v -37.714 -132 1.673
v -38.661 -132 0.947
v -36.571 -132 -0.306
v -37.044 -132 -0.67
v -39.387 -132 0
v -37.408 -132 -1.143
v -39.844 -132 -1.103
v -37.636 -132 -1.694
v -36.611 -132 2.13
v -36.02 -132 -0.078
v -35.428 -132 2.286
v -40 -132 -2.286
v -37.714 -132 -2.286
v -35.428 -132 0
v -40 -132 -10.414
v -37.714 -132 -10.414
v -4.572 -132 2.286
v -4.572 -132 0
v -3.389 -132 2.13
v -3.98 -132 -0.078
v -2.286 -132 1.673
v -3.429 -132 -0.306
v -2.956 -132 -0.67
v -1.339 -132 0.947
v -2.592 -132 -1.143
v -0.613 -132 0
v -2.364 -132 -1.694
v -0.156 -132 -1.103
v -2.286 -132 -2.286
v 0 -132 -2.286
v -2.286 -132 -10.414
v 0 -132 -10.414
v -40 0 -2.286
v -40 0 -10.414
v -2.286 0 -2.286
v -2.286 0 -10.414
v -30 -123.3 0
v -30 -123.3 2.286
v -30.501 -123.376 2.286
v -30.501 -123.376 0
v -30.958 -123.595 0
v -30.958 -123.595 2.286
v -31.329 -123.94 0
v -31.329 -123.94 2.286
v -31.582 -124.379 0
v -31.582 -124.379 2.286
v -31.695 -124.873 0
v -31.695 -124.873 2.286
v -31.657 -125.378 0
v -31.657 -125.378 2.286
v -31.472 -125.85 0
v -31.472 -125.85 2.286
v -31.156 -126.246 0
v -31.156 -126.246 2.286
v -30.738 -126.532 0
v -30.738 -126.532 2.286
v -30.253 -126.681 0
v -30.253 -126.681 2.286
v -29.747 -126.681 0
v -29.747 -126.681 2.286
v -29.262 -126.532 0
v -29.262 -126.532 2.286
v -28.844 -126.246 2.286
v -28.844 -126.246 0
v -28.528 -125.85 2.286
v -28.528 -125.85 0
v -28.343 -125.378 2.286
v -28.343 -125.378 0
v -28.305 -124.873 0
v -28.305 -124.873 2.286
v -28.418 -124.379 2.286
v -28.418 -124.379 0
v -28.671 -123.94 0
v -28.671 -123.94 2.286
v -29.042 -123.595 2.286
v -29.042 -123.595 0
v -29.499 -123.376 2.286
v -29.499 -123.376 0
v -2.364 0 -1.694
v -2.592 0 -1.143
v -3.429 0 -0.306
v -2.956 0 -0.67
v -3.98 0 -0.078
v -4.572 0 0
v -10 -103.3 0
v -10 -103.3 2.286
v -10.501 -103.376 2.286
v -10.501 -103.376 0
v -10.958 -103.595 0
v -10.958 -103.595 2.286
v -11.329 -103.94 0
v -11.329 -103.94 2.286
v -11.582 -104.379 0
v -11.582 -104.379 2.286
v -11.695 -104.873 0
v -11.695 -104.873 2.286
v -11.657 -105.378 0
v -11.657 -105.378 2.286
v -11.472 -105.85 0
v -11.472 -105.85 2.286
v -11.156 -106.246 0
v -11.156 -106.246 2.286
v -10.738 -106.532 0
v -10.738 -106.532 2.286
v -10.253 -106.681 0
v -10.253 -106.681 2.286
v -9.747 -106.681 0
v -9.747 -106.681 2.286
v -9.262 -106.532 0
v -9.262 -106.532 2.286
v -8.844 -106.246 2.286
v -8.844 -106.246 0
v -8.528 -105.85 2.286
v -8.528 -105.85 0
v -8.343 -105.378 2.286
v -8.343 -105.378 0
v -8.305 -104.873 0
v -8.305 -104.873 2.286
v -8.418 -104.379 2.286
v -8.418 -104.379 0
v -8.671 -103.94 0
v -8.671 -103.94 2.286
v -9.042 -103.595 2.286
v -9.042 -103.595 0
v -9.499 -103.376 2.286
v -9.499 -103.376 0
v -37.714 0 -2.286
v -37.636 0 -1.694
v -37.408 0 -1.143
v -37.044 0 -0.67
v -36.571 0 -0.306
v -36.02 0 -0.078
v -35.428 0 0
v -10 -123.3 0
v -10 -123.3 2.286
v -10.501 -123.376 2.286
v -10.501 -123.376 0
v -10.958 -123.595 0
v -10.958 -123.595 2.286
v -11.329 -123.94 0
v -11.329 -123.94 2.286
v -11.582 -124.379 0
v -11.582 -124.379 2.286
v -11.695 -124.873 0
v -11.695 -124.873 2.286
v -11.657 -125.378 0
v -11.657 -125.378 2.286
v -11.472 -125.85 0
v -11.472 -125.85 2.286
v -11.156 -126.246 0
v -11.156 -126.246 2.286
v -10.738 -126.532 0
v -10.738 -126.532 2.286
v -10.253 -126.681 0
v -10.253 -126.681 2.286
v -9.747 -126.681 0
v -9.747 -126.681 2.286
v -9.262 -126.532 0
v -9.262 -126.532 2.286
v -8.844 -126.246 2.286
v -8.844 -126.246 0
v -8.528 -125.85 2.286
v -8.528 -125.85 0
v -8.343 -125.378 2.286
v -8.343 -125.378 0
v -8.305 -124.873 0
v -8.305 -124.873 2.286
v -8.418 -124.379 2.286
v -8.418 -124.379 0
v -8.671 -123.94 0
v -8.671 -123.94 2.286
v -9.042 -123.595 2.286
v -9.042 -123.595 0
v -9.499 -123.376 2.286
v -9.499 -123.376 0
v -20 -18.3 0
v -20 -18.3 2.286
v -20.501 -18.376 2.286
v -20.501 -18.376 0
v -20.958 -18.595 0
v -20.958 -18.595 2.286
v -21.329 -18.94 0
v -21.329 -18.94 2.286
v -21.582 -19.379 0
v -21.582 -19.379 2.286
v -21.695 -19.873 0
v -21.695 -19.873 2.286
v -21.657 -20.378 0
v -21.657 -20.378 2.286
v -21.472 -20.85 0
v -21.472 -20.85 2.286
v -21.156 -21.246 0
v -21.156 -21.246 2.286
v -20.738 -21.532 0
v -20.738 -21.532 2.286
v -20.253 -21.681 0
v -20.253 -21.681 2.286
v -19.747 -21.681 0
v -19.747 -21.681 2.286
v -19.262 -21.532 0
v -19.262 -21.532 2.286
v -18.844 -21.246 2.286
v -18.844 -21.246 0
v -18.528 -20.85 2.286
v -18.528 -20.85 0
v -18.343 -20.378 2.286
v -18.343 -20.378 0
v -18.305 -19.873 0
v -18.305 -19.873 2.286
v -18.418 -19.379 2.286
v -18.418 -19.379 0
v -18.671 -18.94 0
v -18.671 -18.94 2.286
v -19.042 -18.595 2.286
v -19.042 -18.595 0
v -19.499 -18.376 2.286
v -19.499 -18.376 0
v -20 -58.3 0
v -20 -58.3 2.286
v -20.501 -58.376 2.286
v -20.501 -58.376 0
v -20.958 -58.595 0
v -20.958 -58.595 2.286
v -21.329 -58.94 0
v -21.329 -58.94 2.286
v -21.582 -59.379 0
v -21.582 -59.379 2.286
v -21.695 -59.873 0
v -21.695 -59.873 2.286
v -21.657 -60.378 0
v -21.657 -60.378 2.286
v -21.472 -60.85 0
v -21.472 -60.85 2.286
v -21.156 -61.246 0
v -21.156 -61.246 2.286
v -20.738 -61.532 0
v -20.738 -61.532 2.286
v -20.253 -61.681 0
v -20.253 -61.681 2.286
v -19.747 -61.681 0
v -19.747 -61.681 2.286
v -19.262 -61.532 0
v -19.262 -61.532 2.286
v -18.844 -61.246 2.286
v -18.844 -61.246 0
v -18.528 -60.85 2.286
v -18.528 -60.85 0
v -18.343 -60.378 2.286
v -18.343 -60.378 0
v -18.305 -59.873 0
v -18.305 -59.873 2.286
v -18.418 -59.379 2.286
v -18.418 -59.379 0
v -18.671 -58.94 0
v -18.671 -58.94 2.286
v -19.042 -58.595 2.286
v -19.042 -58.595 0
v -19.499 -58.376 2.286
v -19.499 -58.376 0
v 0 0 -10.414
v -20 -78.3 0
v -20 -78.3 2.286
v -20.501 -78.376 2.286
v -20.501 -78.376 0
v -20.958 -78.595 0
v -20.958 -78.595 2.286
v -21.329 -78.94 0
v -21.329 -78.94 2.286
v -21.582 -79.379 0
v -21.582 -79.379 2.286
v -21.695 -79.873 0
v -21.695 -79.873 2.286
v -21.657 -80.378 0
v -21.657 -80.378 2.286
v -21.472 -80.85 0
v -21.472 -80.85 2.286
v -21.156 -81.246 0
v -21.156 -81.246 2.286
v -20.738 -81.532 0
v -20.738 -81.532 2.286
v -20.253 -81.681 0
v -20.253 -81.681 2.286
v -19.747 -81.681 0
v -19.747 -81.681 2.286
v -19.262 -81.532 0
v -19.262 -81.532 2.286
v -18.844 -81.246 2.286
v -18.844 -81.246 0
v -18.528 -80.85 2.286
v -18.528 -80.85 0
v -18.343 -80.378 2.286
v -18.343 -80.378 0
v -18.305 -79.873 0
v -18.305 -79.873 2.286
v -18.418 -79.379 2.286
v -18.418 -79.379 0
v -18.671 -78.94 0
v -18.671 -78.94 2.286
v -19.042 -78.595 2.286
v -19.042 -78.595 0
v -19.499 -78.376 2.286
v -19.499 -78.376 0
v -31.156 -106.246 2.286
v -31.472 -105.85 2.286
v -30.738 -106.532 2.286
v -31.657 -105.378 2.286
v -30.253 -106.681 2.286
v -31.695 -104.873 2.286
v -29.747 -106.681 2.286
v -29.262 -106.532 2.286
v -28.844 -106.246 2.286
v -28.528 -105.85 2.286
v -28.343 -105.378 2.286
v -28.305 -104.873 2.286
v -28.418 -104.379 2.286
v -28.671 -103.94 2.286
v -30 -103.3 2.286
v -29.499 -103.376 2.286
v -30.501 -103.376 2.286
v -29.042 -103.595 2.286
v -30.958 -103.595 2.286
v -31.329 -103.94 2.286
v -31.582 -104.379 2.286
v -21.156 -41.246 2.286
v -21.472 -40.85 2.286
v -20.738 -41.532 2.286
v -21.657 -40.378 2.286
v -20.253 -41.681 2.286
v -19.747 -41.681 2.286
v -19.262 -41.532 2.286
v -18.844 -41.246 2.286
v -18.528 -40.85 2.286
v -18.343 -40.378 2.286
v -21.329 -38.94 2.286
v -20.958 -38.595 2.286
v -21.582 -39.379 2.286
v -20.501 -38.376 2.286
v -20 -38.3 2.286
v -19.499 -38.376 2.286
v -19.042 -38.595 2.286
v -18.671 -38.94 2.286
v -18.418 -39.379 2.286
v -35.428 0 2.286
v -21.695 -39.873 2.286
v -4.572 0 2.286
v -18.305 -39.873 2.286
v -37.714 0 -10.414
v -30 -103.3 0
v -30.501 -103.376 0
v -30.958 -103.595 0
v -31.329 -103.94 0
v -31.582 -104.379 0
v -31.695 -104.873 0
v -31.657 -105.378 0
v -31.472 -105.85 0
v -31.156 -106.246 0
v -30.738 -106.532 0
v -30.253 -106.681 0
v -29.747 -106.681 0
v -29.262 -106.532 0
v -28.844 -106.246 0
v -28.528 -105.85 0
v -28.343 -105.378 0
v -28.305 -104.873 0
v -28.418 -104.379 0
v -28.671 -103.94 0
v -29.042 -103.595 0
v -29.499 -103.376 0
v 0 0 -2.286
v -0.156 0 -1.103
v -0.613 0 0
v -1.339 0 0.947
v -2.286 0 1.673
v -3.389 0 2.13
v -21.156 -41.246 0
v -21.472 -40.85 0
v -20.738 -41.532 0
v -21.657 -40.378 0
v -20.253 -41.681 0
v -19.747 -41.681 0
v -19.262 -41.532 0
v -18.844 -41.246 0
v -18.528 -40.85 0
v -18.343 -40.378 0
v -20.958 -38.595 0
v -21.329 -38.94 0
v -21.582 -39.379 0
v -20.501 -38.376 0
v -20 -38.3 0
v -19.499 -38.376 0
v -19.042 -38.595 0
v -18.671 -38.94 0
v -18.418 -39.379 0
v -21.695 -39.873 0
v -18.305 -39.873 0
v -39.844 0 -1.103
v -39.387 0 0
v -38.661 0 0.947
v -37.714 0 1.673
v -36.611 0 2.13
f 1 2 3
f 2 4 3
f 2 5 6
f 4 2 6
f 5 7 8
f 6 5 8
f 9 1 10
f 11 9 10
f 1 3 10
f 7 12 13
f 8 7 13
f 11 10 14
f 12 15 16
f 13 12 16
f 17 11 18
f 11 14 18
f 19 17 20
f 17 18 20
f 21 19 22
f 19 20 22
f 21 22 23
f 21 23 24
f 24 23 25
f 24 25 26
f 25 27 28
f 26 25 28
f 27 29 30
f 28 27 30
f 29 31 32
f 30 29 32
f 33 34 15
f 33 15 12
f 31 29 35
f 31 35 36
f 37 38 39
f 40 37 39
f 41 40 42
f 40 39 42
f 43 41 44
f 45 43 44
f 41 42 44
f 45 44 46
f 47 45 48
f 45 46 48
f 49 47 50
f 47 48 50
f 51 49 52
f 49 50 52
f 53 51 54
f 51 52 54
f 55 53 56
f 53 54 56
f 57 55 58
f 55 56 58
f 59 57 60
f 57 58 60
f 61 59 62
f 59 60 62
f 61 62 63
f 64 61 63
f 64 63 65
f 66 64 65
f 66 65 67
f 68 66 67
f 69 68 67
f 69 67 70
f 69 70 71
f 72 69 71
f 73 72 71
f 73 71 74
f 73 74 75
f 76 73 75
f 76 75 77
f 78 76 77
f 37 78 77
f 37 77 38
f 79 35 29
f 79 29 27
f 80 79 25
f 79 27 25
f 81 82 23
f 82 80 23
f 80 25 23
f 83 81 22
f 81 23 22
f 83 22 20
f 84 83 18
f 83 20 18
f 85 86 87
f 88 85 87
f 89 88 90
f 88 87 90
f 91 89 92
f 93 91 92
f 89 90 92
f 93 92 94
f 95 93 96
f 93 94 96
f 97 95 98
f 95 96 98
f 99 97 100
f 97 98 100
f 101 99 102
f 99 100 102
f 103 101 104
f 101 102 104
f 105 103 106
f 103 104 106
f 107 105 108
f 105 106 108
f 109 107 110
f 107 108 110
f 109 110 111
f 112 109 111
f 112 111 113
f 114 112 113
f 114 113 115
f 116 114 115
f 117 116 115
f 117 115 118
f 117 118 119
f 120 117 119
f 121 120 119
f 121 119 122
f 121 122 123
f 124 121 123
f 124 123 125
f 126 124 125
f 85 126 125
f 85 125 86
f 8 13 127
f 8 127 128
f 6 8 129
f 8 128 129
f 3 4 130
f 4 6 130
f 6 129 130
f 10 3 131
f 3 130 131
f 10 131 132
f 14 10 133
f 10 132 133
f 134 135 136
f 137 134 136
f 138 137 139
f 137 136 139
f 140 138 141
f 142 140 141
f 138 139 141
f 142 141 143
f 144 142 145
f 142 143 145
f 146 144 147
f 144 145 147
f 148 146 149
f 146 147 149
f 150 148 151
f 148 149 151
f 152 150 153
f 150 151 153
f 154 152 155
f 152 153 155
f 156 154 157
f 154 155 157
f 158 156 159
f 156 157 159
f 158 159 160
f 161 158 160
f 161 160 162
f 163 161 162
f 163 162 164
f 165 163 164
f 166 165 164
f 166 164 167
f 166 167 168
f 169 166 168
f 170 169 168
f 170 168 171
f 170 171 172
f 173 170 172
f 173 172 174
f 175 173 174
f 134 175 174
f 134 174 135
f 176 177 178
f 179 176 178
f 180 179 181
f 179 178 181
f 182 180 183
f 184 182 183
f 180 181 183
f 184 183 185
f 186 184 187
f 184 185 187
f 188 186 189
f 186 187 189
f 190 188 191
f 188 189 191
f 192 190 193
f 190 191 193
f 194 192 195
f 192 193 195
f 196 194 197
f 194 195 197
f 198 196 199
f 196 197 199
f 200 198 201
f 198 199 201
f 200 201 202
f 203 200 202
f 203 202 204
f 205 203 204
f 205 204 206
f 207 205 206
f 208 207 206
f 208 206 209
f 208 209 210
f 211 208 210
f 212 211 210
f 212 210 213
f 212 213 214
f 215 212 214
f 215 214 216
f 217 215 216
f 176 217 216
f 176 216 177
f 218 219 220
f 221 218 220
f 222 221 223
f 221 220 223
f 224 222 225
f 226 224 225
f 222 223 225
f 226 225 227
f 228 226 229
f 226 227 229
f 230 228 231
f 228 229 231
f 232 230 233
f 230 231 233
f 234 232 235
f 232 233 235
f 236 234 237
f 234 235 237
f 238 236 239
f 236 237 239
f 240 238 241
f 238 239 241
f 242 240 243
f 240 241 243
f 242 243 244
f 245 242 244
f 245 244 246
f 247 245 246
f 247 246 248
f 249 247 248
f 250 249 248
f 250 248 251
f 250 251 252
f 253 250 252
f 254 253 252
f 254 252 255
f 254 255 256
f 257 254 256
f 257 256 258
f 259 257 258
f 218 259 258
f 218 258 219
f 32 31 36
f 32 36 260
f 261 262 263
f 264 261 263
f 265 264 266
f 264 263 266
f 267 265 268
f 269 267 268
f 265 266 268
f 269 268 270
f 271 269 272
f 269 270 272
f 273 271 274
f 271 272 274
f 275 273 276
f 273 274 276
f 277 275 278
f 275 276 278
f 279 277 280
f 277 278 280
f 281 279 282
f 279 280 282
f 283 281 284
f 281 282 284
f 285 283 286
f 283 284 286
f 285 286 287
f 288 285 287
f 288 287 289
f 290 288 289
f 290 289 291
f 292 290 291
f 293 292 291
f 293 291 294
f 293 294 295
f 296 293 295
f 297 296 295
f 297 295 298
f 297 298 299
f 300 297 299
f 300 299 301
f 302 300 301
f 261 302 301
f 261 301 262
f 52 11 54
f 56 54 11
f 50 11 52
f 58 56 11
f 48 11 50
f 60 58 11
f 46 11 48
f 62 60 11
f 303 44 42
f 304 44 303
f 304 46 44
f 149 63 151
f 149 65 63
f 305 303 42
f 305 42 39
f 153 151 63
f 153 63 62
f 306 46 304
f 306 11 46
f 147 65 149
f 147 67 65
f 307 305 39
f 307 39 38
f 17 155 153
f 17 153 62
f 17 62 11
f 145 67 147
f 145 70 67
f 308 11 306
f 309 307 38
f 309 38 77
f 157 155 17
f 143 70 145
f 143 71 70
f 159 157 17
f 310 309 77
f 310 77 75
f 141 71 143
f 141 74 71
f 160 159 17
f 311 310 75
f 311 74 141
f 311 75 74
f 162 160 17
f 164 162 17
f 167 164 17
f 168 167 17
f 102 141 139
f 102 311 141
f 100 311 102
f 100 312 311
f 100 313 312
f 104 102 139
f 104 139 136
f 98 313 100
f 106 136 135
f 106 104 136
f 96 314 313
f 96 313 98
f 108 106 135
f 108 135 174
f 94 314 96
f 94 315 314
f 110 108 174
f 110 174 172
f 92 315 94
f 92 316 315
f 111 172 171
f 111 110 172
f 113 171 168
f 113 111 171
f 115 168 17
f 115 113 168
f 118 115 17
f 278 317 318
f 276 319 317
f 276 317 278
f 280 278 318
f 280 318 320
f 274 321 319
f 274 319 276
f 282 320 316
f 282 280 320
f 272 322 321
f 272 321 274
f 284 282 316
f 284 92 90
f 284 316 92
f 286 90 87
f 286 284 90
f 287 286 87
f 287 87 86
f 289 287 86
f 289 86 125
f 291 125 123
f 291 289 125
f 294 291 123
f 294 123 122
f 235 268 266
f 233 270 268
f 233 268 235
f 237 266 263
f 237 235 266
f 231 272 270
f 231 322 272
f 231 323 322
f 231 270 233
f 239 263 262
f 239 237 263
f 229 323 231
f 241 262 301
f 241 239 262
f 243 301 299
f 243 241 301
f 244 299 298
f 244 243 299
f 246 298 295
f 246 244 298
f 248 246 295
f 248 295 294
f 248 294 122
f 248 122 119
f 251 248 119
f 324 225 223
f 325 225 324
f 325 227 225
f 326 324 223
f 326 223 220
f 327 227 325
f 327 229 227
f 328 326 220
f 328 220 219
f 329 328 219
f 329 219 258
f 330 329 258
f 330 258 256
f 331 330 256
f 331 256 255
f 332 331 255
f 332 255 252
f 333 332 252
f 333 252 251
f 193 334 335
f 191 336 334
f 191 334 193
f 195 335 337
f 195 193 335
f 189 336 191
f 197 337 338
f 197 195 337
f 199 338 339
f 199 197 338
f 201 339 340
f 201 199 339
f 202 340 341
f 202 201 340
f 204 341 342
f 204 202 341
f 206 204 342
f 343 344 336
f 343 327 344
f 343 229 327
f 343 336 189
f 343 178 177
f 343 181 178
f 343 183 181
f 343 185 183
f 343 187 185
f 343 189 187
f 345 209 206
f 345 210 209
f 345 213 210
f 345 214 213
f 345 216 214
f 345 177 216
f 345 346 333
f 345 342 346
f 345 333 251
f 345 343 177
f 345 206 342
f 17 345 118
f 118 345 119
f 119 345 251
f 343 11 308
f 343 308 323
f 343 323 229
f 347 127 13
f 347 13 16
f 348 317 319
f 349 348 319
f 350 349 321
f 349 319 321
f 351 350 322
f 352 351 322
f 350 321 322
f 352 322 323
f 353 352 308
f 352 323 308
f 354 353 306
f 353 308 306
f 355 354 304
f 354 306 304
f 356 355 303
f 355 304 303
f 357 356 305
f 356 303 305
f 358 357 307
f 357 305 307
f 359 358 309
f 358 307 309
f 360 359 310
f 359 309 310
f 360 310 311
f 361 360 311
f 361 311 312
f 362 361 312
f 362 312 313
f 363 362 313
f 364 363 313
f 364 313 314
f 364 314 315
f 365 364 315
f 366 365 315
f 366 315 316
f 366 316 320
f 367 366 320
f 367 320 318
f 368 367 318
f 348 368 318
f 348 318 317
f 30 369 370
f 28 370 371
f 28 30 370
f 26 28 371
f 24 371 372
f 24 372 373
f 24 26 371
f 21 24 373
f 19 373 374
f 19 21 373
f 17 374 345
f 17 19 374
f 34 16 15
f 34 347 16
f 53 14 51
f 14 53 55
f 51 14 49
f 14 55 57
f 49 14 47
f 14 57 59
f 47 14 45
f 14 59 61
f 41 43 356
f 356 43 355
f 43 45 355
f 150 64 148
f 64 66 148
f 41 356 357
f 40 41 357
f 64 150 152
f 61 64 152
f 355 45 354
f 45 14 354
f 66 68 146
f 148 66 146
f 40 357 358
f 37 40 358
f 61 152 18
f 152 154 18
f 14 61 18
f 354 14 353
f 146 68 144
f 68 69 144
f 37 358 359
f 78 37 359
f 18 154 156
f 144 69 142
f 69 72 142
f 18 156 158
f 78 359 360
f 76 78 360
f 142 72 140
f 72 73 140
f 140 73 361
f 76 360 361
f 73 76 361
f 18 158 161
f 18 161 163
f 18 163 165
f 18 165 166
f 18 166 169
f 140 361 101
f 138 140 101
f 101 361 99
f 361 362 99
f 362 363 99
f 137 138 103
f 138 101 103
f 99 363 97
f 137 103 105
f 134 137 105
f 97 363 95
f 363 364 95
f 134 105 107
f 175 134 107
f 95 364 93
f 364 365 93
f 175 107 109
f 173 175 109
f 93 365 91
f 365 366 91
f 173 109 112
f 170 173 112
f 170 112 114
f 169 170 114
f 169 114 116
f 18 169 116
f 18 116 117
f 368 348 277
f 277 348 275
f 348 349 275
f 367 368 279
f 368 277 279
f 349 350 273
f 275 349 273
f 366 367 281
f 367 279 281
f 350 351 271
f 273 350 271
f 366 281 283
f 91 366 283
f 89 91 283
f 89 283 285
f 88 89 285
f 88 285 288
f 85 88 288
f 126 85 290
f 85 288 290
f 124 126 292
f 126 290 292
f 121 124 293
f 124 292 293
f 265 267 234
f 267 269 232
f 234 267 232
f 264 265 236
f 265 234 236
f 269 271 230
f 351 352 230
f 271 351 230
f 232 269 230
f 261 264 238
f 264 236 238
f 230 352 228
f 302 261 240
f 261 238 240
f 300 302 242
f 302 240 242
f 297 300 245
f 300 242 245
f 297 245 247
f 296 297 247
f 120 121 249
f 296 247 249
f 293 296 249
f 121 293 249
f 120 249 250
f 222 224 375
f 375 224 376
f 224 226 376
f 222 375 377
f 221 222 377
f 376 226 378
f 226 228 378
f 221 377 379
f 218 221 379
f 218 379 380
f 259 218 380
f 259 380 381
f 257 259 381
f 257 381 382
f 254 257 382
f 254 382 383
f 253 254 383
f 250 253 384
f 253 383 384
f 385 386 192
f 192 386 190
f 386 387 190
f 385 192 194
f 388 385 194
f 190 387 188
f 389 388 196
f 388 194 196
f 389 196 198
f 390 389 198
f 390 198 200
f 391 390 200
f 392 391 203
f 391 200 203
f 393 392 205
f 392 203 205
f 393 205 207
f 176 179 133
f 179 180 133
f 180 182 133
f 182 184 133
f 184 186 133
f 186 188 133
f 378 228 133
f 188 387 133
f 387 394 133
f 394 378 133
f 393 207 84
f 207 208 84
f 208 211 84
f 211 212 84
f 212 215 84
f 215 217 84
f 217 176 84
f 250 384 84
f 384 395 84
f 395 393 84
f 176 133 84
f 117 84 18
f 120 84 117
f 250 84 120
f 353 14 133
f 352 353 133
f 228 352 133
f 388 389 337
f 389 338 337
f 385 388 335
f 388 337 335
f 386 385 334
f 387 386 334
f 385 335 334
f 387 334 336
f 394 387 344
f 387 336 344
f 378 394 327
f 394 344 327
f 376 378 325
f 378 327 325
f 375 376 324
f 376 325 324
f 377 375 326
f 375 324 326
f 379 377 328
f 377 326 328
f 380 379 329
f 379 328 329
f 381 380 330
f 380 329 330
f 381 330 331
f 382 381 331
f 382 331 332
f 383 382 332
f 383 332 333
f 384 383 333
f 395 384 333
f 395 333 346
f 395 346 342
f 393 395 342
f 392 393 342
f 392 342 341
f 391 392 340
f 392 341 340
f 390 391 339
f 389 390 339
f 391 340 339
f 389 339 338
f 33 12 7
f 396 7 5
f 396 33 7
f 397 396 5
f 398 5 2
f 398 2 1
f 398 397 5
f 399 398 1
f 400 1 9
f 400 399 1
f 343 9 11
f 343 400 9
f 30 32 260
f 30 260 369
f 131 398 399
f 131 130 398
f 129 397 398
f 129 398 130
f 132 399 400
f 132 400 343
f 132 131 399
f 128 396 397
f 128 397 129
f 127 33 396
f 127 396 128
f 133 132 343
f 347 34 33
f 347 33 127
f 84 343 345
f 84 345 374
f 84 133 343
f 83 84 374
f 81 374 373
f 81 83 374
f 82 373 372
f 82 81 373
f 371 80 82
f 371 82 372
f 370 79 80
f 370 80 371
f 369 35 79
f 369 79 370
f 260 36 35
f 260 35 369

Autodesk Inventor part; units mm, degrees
ref_plane "YZ Plane" through (0, 0, 0) normal (1, 0, 0) x (0, 1, 0)
ref_plane "XZ Plane" through (0, 0, 0) normal (0, 1, 0) x (-1, 0, 0)
ref_plane "XY Plane" through (0, 0, 0) normal (0, 0, 1) x (1, 0, 0)
sketch "Sketch1" plane through (0, 0, 0) normal (0, 0, 1) x (1, 0, 0)
  line L0 (0, 0) -> (-40, 0)
  line L1 (-40, 0) -> (-40, -132)
  line L2 (-40, -132) -> (0, -132)
  line L3 (0, -132) -> (0, 0)
  line L4 (-30, -105) -> (-10, -105) construction
  line L5 (-10, -105) -> (-10, -125) construction
  line L6 (-10, -125) -> (-30, -125) construction
  line L7 (-30, -125) -> (-30, -105) construction
  line L8 (-20, -105) -> (-20, -80) construction
  line L9 (-20, -80) -> (-20, -60) construction
  line L10 (-20, -60) -> (-20, -40) construction
  line L11 (-20, -40) -> (-20, -20) construction
  line L12 (-20, -20) -> (-20, 0) construction
  dimension "d0" = 20
  dimension "d1" = 20
  dimension "d2" = 25
  dimension "d3" = 20
  dimension "d4" = 7
  dimension "d5" = 10
extrude "Plate1" add sketch "Sketch1" along normal blind 2.286
hole "Hole1" at (-20, -80, 0) at (-20, -60, 0) at (-20, -40, 0) at (-20, -20, 0) at (-10, -125, 0) at (-10, -105, 0) at (-30, -105, 0) at (-30, -125, 0) direction (0, 0, 1) diameter 3.4 end through all clearance for "Socket Head Cap Screw" size "M3" standard "Ansi Metric M Profile"
sketch "Sketch2" plane through (-37.714, 0, 2.286) normal (-1, 0, 0) x (0, -1, 0)
  line L0 (132, 0) -> (0, 0)
  line L1 (0, 0) -> (0, -12.7)
  line L2 (0, -12.7) -> (132, -12.7)
  line L3 (132, -12.7) -> (132, 0)
edge flange "Flange1" height 12.7 angle 90 thickness 2.286 bend radius 2.286 thickness toward (-1, 0, 0) relief tear relief width 2.286 relief depth 1.143 corner gap 2.286 corner form 0 edges at (-40, -66, 0) (0, -66, 0) wall of the first edge with corners at (-37.714, -132, 2.286) (-37.714, 0, 2.286) (-37.714, 0, -10.414) (-37.714, -132, -10.414)
bend "Bend1"
corner "Corner1"
equation "\"d12\" = Thickness"
equation "\"d6\" = Thickness"
equation "\"d14\" = BendReliefWidth"
equation "\"d15\" = BendReliefDepth"
equation "\"d16\" = MinimumRemnant"
equation "\"d17\" = TransitionRadius"
equation "\"d20\" = BendRadius"
equation "\"d21\" = CornerReliefSize"
equation "\"d22\" = GapSize"
equation "\"d23\" = JacobiRadiusSize"
equation "\"BendRadius\" = Thickness"
equation "\"BendReliefWidth\" = Thickness"
equation "\"BendReliefDepth\" = 0.5 * Thickness"
equation "\"CornerReliefSize\" = 4 * Thickness"
equation "\"MinimumRemnant\" = 2 * Thickness"
equation "\"TransitionRadius\" = BendRadius"
equation "\"JacobiRadiusSize\" = BendRadius"
equation "\"GapSize\" = Thickness"
equation "\"Thickness\" = 2.286"
properties part number "Bed Mount"
